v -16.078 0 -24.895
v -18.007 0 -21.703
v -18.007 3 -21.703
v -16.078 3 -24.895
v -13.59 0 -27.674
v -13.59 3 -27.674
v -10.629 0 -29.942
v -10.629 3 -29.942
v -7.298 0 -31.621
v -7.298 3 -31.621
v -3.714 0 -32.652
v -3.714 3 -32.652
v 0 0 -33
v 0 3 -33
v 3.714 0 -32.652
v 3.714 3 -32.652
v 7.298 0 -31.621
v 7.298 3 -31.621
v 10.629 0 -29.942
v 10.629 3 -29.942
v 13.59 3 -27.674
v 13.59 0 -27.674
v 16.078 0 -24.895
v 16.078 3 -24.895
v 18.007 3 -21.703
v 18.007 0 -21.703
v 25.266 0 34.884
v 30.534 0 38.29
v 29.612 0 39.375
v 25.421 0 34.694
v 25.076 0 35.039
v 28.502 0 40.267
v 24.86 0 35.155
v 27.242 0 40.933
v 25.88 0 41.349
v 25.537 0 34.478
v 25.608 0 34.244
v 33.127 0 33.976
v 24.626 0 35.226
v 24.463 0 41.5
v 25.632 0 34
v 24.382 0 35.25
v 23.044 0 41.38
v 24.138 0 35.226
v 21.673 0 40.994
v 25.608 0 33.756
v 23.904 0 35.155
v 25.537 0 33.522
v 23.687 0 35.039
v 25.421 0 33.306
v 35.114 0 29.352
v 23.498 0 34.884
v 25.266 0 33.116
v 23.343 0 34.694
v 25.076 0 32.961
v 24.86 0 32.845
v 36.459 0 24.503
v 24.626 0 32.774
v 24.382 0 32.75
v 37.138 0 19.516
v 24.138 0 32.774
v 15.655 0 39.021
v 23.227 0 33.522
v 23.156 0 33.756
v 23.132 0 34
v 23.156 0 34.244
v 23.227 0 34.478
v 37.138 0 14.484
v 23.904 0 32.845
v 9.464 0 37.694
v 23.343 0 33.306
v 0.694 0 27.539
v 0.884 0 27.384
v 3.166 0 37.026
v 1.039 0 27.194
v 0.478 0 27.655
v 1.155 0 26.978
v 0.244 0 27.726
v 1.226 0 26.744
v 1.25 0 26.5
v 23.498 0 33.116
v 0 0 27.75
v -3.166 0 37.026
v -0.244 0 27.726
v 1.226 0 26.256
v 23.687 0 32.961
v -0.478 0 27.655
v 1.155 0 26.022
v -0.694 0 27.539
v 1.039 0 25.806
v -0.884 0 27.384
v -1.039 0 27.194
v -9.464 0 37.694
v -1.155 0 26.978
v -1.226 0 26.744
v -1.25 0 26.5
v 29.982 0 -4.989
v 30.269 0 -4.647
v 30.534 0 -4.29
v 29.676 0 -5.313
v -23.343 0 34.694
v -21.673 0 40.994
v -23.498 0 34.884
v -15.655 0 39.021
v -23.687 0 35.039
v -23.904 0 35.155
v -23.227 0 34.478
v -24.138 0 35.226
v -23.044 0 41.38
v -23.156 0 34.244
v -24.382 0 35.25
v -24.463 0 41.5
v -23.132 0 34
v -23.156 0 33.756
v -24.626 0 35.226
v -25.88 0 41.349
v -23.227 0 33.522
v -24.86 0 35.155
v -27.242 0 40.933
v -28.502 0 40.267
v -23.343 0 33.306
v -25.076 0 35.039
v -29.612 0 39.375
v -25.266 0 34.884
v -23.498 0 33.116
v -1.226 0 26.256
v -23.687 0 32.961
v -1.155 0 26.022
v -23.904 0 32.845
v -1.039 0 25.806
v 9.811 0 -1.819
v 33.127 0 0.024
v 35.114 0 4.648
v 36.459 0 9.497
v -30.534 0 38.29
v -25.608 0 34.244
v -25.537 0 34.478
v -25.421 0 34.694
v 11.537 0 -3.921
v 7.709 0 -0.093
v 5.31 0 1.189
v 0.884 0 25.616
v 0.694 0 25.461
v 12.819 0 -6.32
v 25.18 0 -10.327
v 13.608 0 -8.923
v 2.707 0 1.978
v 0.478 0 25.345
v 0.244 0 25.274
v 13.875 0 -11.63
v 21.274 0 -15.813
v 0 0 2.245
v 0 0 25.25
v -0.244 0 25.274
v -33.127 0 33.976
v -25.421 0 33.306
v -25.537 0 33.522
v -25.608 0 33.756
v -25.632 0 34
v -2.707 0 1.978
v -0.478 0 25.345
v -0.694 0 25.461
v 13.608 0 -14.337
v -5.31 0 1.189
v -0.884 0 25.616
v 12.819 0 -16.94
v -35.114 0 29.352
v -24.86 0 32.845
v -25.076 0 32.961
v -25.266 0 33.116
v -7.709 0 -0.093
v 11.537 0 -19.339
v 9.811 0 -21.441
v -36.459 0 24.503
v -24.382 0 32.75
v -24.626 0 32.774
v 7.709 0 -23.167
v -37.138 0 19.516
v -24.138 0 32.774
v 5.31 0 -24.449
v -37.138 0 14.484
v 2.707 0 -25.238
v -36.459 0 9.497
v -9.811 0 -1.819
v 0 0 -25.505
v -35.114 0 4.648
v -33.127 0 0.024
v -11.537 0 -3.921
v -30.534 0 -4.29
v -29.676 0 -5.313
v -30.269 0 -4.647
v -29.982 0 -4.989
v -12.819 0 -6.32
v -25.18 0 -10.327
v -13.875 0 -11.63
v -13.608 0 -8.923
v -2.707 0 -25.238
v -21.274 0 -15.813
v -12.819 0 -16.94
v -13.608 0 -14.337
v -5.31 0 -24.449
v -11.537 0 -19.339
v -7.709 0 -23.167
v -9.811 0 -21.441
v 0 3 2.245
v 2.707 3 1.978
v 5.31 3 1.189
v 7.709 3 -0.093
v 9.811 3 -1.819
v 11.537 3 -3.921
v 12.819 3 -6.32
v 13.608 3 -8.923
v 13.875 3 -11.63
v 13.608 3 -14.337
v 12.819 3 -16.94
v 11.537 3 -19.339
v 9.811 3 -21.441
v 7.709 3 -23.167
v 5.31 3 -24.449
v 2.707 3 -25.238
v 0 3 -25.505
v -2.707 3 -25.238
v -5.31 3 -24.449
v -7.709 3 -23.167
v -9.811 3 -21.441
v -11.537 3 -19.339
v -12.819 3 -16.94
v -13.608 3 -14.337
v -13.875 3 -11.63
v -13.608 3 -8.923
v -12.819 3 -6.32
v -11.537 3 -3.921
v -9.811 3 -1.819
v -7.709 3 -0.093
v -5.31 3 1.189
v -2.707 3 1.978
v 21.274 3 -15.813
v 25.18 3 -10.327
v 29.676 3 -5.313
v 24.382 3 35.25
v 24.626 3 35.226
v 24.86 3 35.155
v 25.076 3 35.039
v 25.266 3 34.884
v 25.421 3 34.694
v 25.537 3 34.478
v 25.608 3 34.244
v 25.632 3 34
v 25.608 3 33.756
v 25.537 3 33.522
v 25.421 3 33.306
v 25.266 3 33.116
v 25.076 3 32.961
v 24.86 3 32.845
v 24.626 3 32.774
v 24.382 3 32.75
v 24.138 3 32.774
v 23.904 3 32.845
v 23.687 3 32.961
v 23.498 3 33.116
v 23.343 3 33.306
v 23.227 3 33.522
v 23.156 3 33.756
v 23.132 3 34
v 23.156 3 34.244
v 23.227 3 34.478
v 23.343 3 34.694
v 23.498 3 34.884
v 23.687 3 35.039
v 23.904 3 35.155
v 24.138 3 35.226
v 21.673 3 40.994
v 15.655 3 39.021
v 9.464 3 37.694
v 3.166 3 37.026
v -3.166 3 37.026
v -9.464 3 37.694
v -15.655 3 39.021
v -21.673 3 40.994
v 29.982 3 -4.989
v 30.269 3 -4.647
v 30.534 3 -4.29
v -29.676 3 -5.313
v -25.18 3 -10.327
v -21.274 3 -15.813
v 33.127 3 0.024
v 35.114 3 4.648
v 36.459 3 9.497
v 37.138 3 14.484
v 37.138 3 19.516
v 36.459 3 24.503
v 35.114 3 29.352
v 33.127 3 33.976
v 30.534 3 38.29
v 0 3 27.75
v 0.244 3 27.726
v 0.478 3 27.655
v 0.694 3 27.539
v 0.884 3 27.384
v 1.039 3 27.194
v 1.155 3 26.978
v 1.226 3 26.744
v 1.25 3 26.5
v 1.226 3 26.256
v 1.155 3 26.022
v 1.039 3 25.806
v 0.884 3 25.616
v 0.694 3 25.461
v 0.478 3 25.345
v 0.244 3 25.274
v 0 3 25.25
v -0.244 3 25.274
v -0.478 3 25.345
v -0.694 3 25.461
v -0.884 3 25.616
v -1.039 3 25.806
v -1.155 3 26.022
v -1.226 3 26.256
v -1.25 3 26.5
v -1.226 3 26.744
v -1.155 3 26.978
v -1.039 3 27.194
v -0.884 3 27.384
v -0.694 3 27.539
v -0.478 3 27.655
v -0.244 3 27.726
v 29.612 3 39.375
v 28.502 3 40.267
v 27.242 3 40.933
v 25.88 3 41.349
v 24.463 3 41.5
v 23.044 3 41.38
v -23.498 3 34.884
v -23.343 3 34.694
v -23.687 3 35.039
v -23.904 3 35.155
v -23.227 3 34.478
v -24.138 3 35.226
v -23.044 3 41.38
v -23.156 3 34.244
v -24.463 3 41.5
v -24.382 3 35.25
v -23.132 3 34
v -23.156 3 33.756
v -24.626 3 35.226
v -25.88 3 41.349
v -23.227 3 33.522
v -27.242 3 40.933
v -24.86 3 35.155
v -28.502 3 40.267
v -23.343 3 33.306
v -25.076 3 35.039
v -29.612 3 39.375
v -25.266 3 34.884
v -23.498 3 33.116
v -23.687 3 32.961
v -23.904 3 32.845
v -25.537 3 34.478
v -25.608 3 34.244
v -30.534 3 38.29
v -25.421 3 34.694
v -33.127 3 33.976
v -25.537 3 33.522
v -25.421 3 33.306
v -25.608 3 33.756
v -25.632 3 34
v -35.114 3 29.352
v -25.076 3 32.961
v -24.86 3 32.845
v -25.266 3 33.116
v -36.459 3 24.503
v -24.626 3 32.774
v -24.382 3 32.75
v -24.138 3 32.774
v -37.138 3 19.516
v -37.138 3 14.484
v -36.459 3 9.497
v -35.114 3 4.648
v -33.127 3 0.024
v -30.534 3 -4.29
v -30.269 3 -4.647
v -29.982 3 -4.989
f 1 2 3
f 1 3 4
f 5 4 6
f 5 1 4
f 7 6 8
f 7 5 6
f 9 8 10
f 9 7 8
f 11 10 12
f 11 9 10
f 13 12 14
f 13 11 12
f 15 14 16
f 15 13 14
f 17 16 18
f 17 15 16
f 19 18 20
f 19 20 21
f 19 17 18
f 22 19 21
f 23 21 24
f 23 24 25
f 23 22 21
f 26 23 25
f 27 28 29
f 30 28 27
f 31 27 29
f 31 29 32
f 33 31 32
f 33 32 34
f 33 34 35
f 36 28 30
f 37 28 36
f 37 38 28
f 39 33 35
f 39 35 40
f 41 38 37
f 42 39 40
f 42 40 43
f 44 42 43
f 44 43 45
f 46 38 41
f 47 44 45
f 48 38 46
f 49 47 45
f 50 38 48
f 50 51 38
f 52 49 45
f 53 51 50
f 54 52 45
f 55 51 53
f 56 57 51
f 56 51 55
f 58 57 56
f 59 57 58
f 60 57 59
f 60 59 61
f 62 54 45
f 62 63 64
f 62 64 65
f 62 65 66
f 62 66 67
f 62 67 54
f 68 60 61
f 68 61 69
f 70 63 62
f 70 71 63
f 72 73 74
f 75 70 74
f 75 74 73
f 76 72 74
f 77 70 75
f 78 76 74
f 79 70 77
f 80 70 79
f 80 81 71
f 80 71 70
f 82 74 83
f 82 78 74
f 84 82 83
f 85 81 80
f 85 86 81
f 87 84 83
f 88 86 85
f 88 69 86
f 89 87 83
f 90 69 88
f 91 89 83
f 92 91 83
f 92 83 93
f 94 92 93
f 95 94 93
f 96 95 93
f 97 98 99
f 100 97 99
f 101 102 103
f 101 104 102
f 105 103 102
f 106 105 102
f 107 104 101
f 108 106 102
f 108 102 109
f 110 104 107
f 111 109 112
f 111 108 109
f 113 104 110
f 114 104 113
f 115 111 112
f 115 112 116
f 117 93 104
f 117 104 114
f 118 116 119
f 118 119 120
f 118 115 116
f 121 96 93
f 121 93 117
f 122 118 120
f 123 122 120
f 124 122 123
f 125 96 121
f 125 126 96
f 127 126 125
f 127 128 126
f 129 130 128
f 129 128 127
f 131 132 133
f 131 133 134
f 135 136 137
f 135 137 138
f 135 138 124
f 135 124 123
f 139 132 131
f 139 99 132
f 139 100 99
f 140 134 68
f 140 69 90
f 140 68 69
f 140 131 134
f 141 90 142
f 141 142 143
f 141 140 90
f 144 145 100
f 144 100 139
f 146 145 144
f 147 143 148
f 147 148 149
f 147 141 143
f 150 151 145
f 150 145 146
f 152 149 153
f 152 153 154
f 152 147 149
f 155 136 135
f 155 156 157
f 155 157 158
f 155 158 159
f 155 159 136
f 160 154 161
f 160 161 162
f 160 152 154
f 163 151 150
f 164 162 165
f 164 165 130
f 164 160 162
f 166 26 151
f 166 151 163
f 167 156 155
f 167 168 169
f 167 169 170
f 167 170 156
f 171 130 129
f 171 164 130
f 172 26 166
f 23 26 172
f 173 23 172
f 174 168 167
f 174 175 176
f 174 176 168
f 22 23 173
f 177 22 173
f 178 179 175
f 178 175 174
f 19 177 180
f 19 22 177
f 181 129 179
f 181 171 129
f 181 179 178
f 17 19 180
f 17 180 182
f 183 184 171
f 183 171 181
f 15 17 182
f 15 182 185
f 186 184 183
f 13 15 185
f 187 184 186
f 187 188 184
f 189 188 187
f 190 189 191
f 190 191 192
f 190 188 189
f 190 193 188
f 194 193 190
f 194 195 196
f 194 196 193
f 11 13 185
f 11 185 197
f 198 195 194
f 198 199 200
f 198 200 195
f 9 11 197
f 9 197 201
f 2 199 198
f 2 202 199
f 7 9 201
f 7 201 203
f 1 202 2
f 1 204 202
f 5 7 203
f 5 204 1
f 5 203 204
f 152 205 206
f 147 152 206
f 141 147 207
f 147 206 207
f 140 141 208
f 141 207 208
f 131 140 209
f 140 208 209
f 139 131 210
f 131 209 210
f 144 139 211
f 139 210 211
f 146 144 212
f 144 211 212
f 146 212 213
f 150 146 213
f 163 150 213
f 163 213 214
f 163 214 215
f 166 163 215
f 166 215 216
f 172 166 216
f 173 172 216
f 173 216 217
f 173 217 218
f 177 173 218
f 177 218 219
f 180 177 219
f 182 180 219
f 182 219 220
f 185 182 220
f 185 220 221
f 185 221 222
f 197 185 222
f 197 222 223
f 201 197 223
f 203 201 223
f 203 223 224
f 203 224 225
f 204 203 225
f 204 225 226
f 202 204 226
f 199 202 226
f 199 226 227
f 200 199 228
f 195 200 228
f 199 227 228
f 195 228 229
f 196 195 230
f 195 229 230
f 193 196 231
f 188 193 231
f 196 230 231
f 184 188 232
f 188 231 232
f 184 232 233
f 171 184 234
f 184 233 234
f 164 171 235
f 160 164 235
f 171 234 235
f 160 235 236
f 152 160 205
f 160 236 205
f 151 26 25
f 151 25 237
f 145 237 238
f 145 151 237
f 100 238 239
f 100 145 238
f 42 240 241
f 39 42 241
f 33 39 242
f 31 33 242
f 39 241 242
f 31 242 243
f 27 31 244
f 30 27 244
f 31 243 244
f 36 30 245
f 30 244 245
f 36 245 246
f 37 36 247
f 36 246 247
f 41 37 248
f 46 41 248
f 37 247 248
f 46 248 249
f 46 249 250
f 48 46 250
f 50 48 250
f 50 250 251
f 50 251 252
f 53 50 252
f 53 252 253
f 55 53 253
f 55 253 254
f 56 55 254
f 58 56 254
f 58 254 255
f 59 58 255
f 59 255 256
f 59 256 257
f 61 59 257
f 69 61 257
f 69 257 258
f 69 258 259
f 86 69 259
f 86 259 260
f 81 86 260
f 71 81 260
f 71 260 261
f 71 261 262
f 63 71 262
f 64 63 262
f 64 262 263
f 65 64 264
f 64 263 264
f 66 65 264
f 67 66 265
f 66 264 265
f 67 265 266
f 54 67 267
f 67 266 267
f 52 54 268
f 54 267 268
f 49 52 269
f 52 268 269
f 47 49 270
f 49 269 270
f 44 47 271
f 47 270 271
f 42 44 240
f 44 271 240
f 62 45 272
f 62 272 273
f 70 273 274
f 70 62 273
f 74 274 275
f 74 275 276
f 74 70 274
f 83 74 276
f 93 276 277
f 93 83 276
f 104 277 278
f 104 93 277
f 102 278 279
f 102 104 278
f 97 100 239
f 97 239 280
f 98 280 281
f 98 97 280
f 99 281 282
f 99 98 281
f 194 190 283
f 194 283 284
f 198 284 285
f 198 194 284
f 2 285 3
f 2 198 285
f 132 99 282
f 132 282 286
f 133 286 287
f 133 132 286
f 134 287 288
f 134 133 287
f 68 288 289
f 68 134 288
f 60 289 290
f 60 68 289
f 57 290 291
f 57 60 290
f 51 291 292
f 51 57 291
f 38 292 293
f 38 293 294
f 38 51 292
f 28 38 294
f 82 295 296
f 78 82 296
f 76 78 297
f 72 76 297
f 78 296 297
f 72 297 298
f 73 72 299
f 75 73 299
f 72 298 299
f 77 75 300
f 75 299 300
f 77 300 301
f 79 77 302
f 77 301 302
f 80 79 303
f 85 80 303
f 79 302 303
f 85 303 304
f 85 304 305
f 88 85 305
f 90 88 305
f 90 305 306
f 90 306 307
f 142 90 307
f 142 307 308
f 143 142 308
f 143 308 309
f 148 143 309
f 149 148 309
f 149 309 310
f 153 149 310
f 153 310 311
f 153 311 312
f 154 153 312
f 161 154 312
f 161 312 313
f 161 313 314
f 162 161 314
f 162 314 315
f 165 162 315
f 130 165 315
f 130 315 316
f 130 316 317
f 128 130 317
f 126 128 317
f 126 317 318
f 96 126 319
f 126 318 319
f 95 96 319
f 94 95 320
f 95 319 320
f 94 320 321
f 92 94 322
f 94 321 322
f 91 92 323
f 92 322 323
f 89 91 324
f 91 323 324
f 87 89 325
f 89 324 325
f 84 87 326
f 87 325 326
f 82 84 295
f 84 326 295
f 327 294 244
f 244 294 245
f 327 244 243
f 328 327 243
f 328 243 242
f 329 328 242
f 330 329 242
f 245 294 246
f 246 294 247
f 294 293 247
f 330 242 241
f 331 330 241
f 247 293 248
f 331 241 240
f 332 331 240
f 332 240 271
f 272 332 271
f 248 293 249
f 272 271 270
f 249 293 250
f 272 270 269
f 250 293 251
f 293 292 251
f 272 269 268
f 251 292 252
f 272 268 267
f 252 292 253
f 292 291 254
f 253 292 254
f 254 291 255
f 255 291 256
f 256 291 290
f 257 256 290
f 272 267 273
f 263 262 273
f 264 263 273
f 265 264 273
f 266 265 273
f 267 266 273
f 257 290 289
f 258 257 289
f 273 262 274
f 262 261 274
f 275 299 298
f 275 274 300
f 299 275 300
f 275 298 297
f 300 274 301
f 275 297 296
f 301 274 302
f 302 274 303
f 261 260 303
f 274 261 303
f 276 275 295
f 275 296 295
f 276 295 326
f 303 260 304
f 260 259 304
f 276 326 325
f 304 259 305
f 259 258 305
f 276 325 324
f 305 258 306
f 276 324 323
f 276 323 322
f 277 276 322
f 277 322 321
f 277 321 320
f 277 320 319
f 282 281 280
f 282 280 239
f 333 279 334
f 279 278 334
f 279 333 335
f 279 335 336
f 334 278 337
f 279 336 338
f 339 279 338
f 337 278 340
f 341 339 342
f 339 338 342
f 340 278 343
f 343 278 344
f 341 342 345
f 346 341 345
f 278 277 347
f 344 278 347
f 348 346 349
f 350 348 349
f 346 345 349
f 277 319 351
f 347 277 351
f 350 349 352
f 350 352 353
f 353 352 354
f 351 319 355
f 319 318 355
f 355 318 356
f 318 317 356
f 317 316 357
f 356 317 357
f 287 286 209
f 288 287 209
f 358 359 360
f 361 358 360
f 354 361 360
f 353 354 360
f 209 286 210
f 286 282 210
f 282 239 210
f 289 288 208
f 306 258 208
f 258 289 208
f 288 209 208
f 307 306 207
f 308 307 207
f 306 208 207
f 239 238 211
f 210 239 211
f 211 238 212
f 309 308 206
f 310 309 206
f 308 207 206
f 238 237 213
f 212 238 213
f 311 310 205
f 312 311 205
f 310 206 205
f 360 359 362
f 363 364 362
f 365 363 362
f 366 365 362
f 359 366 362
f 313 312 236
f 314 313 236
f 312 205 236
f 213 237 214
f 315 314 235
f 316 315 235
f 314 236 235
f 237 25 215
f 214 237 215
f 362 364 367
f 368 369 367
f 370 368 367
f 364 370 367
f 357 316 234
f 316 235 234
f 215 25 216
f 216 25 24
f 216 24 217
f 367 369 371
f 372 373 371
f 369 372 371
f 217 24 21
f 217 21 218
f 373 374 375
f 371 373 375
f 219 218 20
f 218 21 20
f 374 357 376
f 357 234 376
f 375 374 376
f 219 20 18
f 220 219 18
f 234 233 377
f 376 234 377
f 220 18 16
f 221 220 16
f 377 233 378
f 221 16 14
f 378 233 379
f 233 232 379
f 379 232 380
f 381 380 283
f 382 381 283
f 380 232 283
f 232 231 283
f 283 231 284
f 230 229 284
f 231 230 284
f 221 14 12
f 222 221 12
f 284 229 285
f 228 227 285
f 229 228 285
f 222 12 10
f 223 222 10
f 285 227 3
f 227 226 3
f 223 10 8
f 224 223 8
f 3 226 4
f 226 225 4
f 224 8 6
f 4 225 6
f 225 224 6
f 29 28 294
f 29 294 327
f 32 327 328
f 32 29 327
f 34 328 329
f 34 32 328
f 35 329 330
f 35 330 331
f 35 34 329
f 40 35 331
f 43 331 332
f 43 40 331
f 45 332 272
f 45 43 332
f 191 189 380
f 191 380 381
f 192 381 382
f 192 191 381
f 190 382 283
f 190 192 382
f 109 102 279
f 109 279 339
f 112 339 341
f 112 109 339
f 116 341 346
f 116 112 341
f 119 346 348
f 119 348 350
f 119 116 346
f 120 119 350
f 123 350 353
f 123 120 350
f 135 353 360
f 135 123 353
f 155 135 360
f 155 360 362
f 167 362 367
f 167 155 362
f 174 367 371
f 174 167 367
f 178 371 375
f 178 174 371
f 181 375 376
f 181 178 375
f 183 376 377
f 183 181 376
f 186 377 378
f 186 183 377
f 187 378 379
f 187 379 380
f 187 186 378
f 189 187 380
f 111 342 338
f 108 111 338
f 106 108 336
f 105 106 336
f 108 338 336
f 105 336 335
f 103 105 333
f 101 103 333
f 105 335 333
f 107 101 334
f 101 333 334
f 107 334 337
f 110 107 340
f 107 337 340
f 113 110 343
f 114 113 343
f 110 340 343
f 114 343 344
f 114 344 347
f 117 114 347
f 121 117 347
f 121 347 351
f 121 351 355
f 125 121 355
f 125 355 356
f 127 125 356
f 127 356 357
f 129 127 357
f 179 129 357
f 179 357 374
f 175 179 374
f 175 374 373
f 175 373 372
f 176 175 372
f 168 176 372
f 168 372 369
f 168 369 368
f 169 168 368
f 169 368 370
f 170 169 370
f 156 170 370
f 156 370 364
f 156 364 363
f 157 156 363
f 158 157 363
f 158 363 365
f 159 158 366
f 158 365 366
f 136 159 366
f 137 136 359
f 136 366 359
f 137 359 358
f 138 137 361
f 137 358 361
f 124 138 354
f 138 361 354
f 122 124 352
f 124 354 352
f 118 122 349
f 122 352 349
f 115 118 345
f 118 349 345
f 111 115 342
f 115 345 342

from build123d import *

# Parameters (mm, degrees)
BOSS_EXTRUDE1_DEPTH = 3
SKETCH2_R           = 1.25
SKETCH2_R_2         = 13.875
CUT_EXTRUDE1_DEPTH  = 56.828571826


with BuildPart() as part:
    # Sketch1 → Boss-Extrude1 (new body)
    with BuildSketch(Plane(origin=(0, 0, 0), x_dir=(1, 0, 0), z_dir=(0, 1, 0))):
        with BuildLine():
            ThreePointArc((-30.534150334, -38.289553671), (-37.223372122, -17), (-30.534150334, 4.289553671))
            ThreePointArc((-30.534150334, 4.289553671), (-30.127865646, 4.820197467), (-29.675955722, 5.312566746))
            ThreePointArc((-29.675955722, 5.312566746), (-23.149545378, 13.015308608), (-18.007026439, 21.703275178))
            ThreePointArc((-18.007026439, 21.703275178), (0, 33), (18.007026439, 21.703275178))
            ThreePointArc((18.007026439, 21.703275178), (23.149545378, 13.015308608), (29.675955722, 5.312566746))
            ThreePointArc((29.675955722, 5.312566746), (30.127865646, 4.820197467), (30.534150334, 4.289553671))
            ThreePointArc((30.534150334, 4.289553671), (37.223372122, -17), (30.534150334, -38.289553671))
            ThreePointArc((30.534150334, -38.289553671), (26.570942981, -41.173440783), (21.67283286, -40.993622447))
            ThreePointArc((21.67283286, -40.993622447), (0, -36.942602025), (-21.67283286, -40.993622447))
            ThreePointArc((-21.67283286, -40.993622447), (-26.570942981, -41.173440783), (-30.534150334, -38.289553671))
        make_face()
    extrude(amount=BOSS_EXTRUDE1_DEPTH)

    # Sketch2 → Cut-Extrude1 (cut, through all)
    with BuildSketch(Plane(origin=(0, 3, 0), x_dir=(1, 0, 0), z_dir=(0, 1, 0))):
        with Locations(Location((-24.381936968, -34, 0), (0, 0, 270))):
            Circle(SKETCH2_R)
        with Locations(Location((24.381936968, -34, 0), (0, 0, 270))):
            Circle(SKETCH2_R)
        with Locations(Location((0, -26.5, 0), (0, 0, 270))):
            Circle(SKETCH2_R)
        with Locations(Location((0, 11.63, 0), (0, 0, 270))):
            Circle(SKETCH2_R_2)
    extrude(amount=-CUT_EXTRUDE1_DEPTH, mode=Mode.SUBTRACT)


solid = part.part
